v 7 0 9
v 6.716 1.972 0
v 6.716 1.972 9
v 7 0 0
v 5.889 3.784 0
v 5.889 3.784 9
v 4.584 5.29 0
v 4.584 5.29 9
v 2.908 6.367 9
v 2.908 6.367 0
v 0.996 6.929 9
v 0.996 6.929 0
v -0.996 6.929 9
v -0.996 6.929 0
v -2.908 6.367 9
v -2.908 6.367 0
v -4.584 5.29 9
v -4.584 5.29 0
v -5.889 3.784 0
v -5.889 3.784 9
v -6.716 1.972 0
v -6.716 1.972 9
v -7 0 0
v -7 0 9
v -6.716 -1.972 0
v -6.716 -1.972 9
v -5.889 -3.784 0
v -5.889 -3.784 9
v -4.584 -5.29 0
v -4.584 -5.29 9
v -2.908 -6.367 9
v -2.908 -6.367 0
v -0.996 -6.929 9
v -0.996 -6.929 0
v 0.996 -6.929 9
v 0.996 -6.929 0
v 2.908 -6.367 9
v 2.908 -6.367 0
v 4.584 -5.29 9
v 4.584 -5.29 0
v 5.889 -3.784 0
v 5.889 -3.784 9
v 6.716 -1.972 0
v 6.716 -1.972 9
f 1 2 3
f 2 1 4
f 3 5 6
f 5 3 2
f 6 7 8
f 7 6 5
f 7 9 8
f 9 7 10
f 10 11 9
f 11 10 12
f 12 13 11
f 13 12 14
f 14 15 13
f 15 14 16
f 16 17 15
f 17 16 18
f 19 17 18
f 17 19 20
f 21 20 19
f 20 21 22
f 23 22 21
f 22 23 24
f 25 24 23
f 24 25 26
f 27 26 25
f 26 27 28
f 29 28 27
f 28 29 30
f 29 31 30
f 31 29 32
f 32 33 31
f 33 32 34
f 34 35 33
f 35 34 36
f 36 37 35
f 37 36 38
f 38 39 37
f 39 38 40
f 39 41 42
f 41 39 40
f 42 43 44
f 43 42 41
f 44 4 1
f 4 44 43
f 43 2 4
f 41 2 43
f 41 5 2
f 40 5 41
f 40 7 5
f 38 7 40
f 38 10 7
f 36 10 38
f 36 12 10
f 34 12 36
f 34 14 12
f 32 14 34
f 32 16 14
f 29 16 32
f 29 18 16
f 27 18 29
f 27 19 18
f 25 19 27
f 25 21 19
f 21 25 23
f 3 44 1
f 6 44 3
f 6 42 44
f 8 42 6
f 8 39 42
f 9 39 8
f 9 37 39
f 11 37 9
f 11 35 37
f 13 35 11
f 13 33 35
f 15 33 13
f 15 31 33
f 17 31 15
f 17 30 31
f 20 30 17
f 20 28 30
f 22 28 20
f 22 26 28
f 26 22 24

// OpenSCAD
// Generated by SolidPython 1.0.1 on 2020-07-29 00:46:44


cylinder(h = 9, r1 = 7, r2 = 7);
/***********************************************
*********      SolidPython code:      **********
************************************************
 
# import packages: SolidPython
from solid import *
from solid.utils import *
from itertools import chain, combinations, permutations


class Resize:

    def __init__(self, scad_file):
        self.scad_file = scad_file
        #self.scad_file = import_scad(scad_file)
        # cone/cylinder param:
        self.r1 = 0
        self.r2 = 0
        self.h = 0
        # rectangular prism param:
        self.w = 0
        self.l = 0
        # ellipse param:
        self.r = 0

    # import OpenScad code (file name corresponds to shape)


    # classify shape + parameters
    def assign(self, param1, param2, param3):
        if self.scad_file == 'cone.scad':
            self.r1 = param1
            self.r2 = param2
            self.h = param3
        elif self.scad_file == 'cylinder.scad':
            self.r1 = param1
            self.r2 = param2
            self.h = param3
        elif self.scad_file == 'rectangularPrism.scad':
            self.h = param1
            self.l = param2
            self.w = param3
        else:
            self.r = param1
            self.h = param2

    # resize parameters
    def iterate(self):
        x = range(3, 20, 2)
        i = 1
        if self.scad_file == 'cone.scad':
            tempList = list(permutations(x, 2))
            for temp in tempList:
                param1 = temp[0]
                param2 = temp[1]
                filepath = 'produced_scad_files/' + 'cone' + str(param1) + '_' + str(param2) + '_' + '.scad'
                scad_render_to_file(cylinder(h=param1, r1=param2, r2=0), filepath)

        elif self.scad_file == 'cylinder.scad':
            tempList = list(permutations(x, 3))
            for temp in tempList:
                param1 = temp[0]
                param2 = temp[1]
                filepath = 'produced_scad_files/' + 'cylinder' + str(param1) + '_' + str(param2) + '_' + '.scad'
                scad_render_to_file(cylinder(h=param1, r1=param2, r2=param2), filepath)

        elif self.scad_file == 'rectangularPrism.scad':
            tempList = list(permutations(x, 3))
            for temp in tempList:
                param1 = temp[0]
                param2 = temp[1]
                param3 = temp[2]
                filepath = 'produced_scad_files/' + 'rectangularPrism' + str(param1) + '_' + str(param2) + '_' + str(
                    param3) + '.scad'
                scad_render_to_file(cube(size=(param1, param2, param3)), filepath)

        elif self.scad_file == 'ellipse.scad':
            tempList = list(permutations(x, 4))
            for temp in tempList:
                param1 = temp[0]
                param2 = temp[1]
                param3 = temp[2]
                param4 = temp[3]
                filepath = 'produced_scad_files/' + 'ellipse' + str(param1) + '_' + str(param2) + '_' + str(param3) + '_' + str(param4) + '.scad'
                scad_render_to_file(scale([param1, param2, param3])(sphere(r=param4)), filepath)

    def render_to_scadfile(self):
        scad_render_to_file(scad, 'example.scad') 
 
************************************************/
